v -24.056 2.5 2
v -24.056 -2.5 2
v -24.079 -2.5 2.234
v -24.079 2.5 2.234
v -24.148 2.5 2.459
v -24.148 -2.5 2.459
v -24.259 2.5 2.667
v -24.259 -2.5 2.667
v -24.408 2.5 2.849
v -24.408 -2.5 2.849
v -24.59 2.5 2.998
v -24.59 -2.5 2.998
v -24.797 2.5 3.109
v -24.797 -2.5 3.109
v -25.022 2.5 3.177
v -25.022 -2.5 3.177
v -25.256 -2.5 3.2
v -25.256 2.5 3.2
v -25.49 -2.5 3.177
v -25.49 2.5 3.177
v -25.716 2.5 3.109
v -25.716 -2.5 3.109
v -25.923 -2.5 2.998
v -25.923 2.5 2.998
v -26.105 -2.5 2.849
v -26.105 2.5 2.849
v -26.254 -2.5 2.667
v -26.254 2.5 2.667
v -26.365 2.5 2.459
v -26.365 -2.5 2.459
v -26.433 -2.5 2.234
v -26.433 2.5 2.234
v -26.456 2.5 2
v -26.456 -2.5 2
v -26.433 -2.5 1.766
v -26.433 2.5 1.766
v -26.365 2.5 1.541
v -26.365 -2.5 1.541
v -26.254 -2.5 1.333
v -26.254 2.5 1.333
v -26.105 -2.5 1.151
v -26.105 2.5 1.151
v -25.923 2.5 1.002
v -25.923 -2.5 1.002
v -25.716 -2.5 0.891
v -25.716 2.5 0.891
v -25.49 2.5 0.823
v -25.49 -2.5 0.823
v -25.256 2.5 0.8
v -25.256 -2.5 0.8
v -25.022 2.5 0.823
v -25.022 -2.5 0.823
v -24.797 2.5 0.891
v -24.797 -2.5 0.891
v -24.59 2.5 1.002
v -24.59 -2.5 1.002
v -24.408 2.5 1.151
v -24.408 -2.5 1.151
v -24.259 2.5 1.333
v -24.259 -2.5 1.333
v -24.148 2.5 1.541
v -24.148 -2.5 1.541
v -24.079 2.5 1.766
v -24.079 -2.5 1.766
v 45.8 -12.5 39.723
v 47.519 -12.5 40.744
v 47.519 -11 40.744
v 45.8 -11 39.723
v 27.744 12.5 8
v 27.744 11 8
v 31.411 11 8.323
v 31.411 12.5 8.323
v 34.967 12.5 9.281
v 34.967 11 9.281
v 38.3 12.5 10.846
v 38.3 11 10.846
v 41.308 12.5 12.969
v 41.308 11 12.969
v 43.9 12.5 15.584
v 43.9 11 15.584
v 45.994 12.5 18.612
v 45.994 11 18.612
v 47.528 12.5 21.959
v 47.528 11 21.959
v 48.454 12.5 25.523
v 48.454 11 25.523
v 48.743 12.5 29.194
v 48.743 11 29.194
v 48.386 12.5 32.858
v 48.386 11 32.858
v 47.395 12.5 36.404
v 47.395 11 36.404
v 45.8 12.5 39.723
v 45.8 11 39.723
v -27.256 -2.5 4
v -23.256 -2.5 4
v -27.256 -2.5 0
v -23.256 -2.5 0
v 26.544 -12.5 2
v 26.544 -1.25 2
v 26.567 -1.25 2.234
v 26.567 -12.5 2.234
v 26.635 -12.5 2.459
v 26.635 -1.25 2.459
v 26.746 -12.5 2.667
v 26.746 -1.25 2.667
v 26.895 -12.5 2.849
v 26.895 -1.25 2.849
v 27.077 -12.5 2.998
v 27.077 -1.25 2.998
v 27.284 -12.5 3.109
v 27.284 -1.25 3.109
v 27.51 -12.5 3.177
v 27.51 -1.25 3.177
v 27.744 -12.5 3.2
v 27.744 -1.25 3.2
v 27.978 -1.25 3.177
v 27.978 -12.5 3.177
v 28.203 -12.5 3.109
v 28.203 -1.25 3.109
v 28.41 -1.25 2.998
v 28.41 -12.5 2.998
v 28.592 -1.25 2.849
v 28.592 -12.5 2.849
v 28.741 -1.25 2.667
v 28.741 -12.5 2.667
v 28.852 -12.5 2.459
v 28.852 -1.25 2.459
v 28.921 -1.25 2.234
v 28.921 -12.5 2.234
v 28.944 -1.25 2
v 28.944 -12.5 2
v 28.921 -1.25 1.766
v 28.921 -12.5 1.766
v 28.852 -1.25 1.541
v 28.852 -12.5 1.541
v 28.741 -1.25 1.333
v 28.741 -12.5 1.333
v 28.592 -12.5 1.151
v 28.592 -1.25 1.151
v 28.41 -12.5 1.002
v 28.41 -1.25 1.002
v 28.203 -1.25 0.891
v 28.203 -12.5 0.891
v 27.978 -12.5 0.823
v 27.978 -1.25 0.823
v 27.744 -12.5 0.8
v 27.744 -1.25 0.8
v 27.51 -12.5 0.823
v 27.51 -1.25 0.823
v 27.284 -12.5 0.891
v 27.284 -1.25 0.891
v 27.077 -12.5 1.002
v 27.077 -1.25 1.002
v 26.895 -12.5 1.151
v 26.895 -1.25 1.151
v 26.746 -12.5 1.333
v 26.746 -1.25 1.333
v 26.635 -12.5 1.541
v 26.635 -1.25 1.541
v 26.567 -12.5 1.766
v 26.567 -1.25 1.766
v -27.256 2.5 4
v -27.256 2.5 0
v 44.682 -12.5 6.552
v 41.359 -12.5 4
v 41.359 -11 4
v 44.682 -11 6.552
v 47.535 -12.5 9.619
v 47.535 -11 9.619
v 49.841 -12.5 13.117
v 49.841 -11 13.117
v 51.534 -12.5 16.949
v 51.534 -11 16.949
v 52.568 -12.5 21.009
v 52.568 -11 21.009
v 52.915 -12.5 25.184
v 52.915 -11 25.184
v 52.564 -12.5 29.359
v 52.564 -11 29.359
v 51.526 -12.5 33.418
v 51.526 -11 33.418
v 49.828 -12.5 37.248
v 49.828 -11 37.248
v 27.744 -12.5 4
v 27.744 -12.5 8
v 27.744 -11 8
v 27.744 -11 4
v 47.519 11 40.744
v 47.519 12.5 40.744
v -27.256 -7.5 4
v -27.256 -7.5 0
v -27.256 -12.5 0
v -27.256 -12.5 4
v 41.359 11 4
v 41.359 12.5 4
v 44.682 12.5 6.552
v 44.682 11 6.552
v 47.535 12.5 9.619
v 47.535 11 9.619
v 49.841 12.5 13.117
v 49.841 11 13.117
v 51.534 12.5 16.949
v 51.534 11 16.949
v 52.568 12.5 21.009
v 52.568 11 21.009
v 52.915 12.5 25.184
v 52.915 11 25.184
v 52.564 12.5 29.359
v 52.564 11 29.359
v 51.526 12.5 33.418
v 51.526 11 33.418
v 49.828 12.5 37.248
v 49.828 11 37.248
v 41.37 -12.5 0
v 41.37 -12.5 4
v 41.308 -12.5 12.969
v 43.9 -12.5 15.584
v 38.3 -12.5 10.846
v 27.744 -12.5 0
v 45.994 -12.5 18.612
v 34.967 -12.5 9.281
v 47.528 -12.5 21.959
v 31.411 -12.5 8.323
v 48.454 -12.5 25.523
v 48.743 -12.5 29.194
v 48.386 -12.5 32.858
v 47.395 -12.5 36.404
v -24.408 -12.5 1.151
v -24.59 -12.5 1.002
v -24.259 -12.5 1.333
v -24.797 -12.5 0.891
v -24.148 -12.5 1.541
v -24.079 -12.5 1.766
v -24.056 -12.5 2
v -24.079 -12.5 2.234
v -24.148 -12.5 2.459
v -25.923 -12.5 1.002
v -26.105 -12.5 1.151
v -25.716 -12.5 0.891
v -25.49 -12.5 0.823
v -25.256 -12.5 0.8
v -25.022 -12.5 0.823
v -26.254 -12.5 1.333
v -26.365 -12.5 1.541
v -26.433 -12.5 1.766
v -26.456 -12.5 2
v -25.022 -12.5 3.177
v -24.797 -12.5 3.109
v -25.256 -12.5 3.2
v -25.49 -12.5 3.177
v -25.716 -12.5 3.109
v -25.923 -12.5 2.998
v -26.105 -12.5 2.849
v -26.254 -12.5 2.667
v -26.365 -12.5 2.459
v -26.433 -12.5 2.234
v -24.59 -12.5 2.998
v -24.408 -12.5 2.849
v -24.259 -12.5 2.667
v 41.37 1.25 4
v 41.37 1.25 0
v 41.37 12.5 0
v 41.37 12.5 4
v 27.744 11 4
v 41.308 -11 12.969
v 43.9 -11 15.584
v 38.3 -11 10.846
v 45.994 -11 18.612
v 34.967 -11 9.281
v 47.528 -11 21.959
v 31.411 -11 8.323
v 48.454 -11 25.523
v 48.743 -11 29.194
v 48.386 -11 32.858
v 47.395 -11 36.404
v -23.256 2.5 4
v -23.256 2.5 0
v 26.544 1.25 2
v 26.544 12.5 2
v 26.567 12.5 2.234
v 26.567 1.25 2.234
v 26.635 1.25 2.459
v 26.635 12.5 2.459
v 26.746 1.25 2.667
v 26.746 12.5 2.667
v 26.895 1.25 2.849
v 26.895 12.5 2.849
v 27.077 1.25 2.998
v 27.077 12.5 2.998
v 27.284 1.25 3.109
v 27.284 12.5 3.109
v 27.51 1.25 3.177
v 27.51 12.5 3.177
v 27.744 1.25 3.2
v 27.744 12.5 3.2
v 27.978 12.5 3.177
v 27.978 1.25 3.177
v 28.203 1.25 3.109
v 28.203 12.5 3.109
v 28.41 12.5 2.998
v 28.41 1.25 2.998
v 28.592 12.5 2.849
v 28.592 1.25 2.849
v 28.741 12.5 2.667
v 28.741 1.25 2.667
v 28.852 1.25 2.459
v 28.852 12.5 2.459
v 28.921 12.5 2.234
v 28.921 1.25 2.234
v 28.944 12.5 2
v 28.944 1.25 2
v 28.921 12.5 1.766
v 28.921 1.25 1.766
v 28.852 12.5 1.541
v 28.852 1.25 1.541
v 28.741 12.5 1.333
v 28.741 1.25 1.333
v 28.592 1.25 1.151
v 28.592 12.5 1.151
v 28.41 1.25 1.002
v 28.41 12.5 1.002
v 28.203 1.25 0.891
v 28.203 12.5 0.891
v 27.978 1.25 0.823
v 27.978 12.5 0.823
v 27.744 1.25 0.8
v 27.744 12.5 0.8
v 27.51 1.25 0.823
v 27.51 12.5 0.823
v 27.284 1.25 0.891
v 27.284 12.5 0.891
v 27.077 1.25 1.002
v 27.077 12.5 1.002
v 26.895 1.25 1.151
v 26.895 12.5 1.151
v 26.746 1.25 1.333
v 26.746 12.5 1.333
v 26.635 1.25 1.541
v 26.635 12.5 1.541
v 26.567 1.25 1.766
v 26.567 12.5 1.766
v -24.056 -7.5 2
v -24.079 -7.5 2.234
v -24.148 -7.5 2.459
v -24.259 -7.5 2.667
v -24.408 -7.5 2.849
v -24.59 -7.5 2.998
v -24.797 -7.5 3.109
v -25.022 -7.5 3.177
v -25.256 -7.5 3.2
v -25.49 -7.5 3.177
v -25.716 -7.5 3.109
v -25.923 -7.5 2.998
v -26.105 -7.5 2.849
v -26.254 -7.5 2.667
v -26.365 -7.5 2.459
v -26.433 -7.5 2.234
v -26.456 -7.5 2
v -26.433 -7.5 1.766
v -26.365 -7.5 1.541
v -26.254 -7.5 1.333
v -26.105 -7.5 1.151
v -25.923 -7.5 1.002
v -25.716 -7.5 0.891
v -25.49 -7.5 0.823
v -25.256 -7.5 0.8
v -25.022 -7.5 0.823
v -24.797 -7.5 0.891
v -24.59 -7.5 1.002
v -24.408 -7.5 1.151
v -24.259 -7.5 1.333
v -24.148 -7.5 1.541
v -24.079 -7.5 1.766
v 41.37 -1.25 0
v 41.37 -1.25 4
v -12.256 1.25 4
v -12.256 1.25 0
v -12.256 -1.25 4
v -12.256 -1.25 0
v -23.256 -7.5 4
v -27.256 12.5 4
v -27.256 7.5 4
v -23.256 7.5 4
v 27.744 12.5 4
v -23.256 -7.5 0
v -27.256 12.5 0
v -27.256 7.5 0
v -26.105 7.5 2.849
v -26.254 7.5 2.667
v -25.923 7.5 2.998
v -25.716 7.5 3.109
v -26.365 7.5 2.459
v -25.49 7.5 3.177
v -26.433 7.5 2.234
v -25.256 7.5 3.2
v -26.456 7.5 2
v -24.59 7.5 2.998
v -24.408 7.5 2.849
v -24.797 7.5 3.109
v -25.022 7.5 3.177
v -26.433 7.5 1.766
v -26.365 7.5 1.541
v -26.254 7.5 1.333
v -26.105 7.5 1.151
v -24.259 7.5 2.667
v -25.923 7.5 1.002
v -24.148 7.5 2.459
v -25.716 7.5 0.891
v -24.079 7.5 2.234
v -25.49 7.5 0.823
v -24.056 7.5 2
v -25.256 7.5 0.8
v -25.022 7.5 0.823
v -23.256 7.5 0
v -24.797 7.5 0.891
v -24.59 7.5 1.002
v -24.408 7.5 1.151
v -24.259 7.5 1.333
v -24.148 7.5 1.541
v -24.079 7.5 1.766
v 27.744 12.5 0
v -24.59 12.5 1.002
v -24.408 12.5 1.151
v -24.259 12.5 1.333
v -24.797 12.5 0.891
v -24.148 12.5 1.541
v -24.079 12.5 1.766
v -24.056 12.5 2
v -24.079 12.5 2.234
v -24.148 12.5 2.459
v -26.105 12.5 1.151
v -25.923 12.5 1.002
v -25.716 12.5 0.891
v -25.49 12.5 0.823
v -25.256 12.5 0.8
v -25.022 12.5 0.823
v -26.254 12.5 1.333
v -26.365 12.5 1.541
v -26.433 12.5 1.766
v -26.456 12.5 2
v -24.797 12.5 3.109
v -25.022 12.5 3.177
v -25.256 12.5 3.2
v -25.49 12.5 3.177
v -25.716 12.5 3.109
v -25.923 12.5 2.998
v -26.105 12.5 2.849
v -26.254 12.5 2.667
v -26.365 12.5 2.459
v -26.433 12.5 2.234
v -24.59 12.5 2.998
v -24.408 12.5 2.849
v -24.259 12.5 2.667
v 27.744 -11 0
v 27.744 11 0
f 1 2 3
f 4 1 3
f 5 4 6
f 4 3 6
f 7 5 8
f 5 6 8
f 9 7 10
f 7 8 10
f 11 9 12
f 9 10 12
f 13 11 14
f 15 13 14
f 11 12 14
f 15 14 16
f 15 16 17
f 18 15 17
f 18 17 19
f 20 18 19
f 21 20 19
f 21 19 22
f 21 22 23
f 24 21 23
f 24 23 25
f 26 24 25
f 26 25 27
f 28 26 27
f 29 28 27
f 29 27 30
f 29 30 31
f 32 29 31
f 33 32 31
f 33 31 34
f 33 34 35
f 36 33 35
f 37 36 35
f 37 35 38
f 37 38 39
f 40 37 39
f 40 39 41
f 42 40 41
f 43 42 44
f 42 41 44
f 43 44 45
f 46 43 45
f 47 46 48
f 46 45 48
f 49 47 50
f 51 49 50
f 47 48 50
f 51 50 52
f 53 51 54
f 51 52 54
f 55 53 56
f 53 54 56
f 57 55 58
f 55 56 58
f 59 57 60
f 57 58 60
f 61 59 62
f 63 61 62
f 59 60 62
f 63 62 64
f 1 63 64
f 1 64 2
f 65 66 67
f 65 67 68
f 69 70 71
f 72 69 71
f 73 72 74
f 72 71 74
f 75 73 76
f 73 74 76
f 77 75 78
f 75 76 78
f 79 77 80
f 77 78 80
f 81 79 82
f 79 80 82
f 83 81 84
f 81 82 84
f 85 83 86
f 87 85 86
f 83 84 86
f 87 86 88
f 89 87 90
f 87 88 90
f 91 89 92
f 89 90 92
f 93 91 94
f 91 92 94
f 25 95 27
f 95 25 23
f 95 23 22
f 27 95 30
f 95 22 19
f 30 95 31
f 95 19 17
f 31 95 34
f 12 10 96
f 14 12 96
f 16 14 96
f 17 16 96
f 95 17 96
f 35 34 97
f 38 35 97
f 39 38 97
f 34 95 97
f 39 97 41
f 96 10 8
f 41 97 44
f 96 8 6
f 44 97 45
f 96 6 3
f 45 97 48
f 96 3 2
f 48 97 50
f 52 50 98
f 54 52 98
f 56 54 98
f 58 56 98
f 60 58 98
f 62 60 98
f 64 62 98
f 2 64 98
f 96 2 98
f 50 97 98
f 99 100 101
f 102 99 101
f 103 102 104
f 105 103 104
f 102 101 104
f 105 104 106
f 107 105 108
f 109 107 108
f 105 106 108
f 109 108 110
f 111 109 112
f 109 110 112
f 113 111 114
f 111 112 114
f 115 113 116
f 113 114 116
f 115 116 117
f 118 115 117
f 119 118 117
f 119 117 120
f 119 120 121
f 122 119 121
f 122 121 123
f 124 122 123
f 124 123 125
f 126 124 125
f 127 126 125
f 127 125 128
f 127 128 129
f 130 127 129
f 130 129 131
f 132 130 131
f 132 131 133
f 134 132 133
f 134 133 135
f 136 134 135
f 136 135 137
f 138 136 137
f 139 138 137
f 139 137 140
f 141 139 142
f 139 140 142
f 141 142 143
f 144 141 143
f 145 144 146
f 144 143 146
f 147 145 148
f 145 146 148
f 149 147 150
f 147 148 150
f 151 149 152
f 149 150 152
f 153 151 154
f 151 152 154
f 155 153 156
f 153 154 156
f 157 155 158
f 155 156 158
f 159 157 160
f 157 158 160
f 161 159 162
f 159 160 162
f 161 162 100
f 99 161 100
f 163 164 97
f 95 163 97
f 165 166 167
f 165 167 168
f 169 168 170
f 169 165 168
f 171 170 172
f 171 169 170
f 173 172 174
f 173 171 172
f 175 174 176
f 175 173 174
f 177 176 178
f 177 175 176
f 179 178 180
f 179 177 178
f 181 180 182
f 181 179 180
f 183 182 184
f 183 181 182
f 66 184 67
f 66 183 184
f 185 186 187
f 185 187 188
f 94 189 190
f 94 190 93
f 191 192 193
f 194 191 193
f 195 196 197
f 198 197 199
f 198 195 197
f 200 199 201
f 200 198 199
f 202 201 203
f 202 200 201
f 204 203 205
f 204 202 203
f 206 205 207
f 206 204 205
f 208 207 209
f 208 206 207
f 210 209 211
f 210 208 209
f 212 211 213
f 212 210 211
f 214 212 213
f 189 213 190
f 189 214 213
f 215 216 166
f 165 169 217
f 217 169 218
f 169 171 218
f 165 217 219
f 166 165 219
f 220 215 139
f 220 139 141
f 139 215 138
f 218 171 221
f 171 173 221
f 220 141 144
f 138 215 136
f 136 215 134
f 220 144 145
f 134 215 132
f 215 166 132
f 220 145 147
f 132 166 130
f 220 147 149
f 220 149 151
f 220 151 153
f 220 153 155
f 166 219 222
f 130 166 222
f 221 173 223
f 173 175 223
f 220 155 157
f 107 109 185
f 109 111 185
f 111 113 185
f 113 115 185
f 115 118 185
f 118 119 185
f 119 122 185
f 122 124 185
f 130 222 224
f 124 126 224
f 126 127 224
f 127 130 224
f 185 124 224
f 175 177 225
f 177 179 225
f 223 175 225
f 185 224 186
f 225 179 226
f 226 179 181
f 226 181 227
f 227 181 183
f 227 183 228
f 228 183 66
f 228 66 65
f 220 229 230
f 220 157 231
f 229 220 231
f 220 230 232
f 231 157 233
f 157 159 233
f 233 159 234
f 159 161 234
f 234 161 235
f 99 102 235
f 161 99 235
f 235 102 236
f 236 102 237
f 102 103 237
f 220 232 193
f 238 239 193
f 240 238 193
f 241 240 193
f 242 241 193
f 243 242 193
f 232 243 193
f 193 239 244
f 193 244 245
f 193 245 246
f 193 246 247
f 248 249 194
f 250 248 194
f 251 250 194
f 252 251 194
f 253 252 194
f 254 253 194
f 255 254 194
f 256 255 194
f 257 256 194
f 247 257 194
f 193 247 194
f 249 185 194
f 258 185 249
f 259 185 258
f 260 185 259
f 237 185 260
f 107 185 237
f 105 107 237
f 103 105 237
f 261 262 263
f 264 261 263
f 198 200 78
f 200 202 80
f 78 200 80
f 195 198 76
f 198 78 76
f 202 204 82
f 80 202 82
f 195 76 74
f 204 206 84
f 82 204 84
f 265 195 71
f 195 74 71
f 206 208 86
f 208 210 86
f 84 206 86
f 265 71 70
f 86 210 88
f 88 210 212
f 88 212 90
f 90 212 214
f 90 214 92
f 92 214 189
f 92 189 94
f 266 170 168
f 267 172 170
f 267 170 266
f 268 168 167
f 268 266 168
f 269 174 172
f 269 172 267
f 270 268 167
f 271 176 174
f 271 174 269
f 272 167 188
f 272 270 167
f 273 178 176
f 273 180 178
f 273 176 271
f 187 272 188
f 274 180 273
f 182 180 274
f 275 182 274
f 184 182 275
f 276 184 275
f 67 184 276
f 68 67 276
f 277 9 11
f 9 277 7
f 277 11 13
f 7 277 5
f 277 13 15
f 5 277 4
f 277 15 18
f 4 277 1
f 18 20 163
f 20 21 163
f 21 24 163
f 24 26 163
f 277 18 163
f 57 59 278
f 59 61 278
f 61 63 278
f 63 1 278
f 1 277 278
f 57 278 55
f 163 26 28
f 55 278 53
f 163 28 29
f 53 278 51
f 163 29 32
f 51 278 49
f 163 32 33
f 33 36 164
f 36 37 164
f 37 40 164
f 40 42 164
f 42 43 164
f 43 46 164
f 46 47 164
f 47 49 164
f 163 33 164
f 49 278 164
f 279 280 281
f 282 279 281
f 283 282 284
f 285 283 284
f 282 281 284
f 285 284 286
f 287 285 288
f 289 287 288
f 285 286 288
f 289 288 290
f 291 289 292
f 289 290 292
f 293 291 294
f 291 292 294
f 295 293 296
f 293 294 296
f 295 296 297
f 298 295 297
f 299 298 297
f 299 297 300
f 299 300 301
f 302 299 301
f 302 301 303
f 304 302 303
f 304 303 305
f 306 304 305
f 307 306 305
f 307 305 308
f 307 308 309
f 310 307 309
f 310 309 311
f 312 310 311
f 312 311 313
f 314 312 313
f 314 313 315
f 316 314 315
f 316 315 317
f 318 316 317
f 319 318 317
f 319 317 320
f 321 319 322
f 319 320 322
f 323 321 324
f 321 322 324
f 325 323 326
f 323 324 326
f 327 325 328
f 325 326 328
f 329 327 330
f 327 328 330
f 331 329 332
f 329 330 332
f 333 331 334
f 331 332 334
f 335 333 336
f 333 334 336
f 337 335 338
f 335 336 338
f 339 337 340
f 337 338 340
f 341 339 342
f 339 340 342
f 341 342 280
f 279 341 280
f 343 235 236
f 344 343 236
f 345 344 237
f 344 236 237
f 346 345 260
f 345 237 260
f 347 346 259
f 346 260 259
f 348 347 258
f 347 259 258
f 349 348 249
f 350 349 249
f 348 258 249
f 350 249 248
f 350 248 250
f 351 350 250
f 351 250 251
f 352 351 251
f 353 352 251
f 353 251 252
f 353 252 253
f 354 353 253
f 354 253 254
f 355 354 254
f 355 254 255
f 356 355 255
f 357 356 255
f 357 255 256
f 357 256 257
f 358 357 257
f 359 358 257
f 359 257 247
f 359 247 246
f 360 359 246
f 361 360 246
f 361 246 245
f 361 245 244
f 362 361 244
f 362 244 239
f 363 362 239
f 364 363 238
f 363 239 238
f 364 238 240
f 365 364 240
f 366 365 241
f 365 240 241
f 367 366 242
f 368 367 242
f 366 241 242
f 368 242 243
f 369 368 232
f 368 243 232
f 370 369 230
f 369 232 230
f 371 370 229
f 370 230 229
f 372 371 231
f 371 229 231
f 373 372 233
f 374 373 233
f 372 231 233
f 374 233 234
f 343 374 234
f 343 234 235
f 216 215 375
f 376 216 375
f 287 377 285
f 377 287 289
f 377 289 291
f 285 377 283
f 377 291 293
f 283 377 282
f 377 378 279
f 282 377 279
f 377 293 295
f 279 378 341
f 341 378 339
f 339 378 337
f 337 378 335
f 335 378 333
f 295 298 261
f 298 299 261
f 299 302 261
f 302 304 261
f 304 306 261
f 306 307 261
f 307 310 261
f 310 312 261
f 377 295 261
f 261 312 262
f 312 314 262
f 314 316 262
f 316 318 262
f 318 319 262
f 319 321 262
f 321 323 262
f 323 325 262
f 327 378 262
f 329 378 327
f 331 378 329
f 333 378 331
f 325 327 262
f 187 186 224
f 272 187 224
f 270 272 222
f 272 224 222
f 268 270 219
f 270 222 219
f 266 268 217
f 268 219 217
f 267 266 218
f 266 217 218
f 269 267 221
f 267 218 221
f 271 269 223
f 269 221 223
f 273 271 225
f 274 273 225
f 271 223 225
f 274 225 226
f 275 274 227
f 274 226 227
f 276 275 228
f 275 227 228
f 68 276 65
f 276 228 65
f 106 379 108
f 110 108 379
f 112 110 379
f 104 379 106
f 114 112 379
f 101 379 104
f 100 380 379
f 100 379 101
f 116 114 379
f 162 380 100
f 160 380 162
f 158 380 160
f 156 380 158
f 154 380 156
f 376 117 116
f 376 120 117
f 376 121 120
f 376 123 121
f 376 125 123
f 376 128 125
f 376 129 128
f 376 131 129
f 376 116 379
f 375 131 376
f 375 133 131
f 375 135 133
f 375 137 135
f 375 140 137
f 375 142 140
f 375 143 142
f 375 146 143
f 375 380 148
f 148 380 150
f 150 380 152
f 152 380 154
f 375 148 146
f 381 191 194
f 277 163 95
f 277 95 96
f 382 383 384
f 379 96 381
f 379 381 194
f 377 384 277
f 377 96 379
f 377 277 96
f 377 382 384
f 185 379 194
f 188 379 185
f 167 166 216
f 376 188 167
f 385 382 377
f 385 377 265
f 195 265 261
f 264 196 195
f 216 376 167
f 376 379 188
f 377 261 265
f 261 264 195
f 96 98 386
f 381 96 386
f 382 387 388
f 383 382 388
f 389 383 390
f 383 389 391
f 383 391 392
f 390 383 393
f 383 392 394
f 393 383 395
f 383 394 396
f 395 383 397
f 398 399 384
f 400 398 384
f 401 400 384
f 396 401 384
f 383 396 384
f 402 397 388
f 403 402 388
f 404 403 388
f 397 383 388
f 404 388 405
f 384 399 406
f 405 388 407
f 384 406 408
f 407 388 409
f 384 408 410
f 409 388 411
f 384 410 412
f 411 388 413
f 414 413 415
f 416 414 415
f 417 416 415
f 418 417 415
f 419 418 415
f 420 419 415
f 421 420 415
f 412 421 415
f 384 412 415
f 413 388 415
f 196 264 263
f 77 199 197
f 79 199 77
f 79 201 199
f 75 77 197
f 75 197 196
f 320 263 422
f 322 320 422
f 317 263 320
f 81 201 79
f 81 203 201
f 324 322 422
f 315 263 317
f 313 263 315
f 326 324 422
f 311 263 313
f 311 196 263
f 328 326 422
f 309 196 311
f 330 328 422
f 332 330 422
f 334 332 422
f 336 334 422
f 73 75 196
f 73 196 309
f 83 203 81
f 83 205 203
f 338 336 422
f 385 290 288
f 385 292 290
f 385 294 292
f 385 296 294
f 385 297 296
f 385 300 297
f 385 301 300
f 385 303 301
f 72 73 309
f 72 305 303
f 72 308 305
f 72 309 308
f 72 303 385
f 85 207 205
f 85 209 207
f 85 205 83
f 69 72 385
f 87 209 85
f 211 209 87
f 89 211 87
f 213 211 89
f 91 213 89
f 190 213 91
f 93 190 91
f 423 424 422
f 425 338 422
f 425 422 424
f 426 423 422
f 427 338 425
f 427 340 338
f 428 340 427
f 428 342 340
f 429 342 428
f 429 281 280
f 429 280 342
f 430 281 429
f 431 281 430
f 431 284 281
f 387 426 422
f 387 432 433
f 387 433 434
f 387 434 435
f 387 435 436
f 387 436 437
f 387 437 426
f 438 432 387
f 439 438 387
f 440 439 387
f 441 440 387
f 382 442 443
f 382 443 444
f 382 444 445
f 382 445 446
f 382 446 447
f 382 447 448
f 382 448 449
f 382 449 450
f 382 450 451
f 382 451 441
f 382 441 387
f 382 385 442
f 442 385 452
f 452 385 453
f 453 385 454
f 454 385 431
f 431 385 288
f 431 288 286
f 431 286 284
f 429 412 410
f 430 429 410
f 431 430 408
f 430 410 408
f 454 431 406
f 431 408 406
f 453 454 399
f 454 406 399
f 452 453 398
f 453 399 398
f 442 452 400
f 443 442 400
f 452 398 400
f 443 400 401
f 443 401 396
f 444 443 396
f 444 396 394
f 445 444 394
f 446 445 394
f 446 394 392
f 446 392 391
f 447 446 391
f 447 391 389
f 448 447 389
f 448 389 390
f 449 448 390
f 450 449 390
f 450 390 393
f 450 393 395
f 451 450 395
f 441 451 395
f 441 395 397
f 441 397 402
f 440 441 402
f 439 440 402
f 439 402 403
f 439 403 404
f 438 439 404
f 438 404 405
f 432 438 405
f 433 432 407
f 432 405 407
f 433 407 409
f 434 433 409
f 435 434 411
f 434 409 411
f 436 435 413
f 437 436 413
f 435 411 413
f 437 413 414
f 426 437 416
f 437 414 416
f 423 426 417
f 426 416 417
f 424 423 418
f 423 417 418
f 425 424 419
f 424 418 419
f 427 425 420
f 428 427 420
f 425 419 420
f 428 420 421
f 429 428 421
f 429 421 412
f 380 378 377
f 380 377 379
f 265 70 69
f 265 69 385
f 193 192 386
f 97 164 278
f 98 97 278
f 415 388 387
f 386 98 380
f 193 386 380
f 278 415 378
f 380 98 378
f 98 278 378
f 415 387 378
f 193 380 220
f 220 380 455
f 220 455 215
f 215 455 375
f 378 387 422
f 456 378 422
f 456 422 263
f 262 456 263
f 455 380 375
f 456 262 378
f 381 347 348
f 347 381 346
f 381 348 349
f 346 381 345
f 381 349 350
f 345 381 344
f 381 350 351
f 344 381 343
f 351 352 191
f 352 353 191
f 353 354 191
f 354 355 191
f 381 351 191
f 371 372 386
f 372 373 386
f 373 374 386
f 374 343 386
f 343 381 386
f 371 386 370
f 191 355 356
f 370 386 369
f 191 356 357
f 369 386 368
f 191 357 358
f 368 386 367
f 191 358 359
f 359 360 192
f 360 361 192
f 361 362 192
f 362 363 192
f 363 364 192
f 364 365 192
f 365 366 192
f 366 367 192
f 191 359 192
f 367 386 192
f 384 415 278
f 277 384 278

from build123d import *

# Parameters (mm, degrees)
PAD_DEPTH           = 4
SKETCH001_R         = 1.2
POCKET_DEPTH        = 25.001
PAD001_DEPTH        = 1.5
LINEARPATTERN_COUNT = 2
LINEARPATTERN_PITCH = 23.5
SKETCH003_R         = 1.2
POCKET001_DEPTH     = 25.001
SKETCH004_W         = 57.256356
SKETCH004_H         = 2.5
POCKET002_DEPTH     = 40.745142


with BuildPart() as part:
    # Sketch → Pad (new body)
    with BuildSketch(Plane.XY):
        Polygon((41.369523, 12.5), (-27.256356, 12.5), (-27.256356, 7.5), (-23.256356, 7.5), (-23.256356, 2.5), (-27.256356, 2.5), (-27.256356, -2.5), (-23.256356, -2.5), (-23.256356, -7.5), (-27.256356, -7.5), (-27.256356, -12.5), (41.369523, -12.5), align=None)
    extrude(amount=PAD_DEPTH)

    # Sketch001 → Pocket (cut, through all)
    with BuildSketch(Plane.XZ.offset(12.5)):
        with Locations((-25.256356, 2)):
            Circle(SKETCH001_R)
    extrude(amount=-POCKET_DEPTH, mode=Mode.SUBTRACT)

    # Sketch002 → Pad001 (new body)
    with BuildSketch(Plane.XZ.offset(12.5)):
        with BuildLine():
            ThreePointArc((27.743644, 8), (45.994413, 18.612054), (45.799645, 39.722912))
            Line((47.519264, 40.744142), (45.799645, 39.722912))
            ThreePointArc((27.743644, 0), (50.388512, 14.180292), (47.519264, 40.744142))
            Line((27.743644, 8), (27.743644, 0))
        make_face()
    pad001 = extrude(amount=-PAD001_DEPTH)

    # LinearPattern: Pad001 ×2
    with Locations(*[(0, i * LINEARPATTERN_PITCH, 0) for i in range(1, LINEARPATTERN_COUNT)]):
        add(pad001)

    # Sketch003 → Pocket001 (cut, through all)
    with BuildSketch(Plane(origin=(0, 12.5, 0), x_dir=(-1, 0, 0), z_dir=(0, 1, 0))):
        with Locations((-27.743644, 2)):
            Circle(SKETCH003_R)
    extrude(amount=-POCKET001_DEPTH, mode=Mode.SUBTRACT)

    # Sketch004 → Pocket002 (cut, through all)
    with BuildSketch(Plane(origin=(0, 0, 0), x_dir=(1, 0, 0), z_dir=(0, 0, -1))):
        with Locations((16.371822, 0)):
            Rectangle(SKETCH004_W, SKETCH004_H)
    extrude(amount=-POCKET002_DEPTH, mode=Mode.SUBTRACT)


solid = part.part
